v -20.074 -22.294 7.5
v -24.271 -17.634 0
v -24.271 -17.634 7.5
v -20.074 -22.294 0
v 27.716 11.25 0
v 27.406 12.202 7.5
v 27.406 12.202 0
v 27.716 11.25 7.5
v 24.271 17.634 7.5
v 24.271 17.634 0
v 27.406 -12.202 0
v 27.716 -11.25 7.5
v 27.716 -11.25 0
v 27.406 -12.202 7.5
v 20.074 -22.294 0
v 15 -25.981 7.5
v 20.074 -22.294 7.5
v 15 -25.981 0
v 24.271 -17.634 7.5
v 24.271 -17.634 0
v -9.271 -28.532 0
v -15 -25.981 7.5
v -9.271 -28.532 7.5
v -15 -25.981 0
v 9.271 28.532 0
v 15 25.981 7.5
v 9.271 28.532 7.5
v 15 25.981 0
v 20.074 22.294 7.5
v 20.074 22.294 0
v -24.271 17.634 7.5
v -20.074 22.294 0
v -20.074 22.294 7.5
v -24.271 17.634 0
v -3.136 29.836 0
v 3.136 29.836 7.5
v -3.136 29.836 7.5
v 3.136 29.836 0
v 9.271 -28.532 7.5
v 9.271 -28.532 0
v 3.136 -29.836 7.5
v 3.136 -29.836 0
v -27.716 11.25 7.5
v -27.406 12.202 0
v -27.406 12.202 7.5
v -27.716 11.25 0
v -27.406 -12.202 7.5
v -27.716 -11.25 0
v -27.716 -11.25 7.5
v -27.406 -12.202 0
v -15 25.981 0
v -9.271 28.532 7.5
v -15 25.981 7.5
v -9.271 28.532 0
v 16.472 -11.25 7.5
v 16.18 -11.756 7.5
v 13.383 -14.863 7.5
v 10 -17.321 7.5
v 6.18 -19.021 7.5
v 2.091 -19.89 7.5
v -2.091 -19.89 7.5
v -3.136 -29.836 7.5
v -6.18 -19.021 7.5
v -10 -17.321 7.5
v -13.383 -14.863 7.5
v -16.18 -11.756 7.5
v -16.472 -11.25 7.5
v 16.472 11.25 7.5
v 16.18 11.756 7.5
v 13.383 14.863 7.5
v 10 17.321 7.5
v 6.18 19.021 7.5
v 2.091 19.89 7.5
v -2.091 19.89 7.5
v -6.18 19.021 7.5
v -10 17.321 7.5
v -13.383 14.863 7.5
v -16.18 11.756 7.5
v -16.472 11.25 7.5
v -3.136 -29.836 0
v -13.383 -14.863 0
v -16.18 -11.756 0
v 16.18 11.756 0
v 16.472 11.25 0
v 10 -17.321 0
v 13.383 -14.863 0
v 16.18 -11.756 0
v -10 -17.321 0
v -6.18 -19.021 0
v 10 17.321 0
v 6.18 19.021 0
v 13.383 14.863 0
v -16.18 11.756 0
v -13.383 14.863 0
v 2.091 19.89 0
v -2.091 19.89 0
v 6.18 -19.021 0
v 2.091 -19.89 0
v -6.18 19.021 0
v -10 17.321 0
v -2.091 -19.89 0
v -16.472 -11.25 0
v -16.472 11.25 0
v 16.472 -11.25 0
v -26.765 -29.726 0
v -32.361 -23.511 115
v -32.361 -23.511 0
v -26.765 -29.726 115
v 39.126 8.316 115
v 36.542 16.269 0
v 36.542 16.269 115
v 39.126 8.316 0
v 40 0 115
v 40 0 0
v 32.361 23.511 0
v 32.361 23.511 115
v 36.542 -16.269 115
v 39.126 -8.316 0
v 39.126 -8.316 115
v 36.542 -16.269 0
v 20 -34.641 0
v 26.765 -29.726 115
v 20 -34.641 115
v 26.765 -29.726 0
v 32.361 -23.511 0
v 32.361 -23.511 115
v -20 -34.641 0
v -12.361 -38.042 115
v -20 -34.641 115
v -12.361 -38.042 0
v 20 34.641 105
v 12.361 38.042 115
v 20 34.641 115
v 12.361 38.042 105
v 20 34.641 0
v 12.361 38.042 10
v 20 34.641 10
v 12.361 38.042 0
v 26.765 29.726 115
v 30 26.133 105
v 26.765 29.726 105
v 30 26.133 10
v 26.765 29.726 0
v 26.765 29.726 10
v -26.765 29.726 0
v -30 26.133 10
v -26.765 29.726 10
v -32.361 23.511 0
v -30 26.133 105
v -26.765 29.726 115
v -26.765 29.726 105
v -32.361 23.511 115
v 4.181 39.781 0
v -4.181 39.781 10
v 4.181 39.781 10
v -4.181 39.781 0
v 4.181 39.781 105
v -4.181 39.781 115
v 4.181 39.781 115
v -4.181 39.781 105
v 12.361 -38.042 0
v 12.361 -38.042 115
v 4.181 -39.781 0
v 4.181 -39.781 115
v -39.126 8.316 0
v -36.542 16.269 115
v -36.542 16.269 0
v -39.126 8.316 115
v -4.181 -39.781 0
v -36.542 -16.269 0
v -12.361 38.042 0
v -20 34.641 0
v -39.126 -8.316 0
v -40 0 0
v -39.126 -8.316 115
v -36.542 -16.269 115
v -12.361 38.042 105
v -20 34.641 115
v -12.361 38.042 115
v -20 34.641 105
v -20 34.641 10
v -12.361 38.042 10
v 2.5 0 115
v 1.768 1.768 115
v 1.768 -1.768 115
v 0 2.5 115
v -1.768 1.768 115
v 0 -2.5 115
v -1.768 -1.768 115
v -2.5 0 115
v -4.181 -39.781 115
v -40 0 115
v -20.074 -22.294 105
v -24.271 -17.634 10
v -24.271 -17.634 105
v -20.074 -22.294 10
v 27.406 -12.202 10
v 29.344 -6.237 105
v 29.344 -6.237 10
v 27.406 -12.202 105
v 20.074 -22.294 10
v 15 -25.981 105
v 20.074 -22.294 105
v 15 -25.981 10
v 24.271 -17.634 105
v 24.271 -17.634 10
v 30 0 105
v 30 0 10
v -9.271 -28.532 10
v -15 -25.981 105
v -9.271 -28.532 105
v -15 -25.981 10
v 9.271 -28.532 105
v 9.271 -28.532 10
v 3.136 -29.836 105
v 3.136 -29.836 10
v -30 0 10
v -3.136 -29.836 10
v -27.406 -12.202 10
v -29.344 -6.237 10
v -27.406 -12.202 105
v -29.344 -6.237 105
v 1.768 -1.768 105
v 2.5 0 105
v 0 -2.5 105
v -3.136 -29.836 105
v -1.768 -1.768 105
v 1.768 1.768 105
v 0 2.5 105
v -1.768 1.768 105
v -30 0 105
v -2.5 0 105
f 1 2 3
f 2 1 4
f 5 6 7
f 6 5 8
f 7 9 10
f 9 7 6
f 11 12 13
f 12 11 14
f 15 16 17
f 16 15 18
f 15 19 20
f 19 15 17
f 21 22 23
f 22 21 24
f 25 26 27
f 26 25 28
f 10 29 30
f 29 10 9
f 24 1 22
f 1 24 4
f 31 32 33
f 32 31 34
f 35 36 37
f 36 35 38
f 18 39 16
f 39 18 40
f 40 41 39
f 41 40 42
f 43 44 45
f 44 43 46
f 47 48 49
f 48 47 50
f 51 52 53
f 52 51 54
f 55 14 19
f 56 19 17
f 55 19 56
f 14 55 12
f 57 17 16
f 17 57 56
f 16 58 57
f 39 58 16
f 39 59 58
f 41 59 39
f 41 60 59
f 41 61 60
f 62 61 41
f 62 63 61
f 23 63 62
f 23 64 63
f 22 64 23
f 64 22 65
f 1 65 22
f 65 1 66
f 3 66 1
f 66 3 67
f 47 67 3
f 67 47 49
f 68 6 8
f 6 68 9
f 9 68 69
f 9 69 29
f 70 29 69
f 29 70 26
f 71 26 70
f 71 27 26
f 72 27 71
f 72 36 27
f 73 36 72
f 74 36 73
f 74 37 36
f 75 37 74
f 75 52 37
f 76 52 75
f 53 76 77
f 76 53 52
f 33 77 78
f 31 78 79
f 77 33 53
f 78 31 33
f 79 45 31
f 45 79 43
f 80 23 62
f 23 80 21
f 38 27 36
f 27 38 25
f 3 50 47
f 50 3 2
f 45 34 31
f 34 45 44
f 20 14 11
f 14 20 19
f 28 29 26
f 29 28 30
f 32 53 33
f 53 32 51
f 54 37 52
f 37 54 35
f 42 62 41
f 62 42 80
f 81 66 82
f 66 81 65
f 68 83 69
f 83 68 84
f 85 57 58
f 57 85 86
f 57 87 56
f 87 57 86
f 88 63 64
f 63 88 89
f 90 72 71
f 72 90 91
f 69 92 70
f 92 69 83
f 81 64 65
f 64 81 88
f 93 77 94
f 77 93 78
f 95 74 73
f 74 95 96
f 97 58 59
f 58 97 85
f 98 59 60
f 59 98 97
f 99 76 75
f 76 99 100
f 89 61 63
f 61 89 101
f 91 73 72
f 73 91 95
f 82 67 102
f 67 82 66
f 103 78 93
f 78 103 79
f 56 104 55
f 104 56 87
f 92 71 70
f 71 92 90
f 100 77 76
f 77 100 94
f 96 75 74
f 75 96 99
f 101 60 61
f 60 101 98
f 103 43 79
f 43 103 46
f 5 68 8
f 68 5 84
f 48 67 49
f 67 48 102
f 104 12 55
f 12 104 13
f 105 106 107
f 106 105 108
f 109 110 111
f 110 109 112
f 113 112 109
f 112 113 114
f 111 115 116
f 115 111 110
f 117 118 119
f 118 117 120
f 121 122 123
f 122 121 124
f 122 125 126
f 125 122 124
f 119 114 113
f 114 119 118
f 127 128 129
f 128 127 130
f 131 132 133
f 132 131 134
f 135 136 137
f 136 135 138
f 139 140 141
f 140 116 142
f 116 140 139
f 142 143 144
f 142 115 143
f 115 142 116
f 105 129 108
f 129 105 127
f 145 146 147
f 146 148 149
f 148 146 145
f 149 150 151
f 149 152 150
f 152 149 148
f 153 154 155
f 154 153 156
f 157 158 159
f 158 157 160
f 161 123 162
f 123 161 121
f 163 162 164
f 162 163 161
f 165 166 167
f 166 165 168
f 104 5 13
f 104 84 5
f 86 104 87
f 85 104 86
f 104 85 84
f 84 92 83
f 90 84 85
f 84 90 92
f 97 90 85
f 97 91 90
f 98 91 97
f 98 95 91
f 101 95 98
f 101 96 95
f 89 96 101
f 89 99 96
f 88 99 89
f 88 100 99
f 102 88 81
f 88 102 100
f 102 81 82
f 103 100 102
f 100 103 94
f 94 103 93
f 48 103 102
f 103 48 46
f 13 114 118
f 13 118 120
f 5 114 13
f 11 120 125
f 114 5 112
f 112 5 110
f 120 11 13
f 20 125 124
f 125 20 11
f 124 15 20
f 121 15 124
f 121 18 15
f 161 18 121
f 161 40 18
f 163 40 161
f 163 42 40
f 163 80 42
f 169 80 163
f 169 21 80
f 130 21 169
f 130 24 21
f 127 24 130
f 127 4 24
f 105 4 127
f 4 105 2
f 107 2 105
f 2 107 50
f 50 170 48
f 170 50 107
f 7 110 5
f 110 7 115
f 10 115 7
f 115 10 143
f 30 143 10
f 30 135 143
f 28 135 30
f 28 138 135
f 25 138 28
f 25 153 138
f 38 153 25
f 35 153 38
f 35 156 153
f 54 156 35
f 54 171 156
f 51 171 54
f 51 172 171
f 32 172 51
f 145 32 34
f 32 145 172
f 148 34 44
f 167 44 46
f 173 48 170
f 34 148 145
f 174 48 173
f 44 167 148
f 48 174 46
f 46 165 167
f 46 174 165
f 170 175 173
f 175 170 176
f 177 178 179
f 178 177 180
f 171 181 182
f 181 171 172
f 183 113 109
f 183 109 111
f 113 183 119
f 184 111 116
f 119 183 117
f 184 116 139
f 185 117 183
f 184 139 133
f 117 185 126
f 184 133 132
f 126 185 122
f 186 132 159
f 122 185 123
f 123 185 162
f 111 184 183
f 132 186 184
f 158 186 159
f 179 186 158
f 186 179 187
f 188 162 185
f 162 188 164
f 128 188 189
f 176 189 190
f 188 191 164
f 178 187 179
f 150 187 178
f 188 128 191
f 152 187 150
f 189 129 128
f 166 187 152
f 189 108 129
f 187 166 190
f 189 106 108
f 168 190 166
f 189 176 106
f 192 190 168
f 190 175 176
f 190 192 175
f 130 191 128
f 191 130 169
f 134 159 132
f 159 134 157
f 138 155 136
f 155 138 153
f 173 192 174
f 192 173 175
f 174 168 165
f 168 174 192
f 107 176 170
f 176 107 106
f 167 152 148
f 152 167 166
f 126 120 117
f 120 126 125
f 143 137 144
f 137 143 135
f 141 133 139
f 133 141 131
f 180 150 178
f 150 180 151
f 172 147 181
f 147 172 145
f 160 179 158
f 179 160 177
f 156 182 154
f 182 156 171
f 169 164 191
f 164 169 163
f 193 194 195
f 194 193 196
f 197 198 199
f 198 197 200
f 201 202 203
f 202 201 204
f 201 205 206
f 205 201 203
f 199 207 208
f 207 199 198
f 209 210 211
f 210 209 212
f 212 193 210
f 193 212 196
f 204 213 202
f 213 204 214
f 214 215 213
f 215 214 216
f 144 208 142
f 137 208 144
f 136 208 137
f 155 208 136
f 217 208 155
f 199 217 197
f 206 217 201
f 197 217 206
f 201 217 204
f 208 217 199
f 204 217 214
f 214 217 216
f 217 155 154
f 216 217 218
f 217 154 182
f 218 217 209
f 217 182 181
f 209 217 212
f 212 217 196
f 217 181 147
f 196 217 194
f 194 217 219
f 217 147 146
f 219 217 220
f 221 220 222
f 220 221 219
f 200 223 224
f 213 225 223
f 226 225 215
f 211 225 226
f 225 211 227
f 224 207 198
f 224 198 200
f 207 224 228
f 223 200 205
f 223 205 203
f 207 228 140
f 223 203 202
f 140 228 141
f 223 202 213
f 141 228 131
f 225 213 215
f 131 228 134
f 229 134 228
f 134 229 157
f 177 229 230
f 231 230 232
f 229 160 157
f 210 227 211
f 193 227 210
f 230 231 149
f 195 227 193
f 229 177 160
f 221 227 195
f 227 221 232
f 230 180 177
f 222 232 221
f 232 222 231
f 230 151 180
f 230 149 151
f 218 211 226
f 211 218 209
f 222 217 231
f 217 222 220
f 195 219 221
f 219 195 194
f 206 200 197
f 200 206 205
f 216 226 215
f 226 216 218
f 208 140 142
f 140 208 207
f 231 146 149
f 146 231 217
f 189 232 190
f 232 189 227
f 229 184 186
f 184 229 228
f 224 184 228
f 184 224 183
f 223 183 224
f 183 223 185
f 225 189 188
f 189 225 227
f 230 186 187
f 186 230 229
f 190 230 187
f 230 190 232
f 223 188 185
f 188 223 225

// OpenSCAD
r = 30;
h = 200;
thickness = 10;

cubeLength = 3*r;
cubeWidth = .75*r;
cubeHeight = .25*r;

eggR = 30;
eggH = 95;

difference(){
    cylinder(eggH+2*thickness, eggR+thickness, eggR+thickness);
    translate([0, 0, thickness]){
        cylinder(eggH, eggR, eggR);
    };
    translate([-eggR, 0, thickness]){
        cube([2*eggR, 2*eggR, eggH]);
    };
    translate([0,0,-h+thickness*.75]){
        difference(){
            union(){
                cylinder(h, r,r);
                translate([-.5*cubeLength, -.5*cubeWidth, 0]){
                    cube([cubeLength,cubeWidth,cubeHeight]);
                };
            };
            cylinder(h, r-thickness, r-thickness);
            translate([-r,-.5*cubeWidth, cubeWidth]){
                cube([2*r,cubeWidth,h]);
            };
        };
    };
    translate([0,0,thickness+eggH]){
        cylinder(thickness, 2.5, 2.5);
    };
}
